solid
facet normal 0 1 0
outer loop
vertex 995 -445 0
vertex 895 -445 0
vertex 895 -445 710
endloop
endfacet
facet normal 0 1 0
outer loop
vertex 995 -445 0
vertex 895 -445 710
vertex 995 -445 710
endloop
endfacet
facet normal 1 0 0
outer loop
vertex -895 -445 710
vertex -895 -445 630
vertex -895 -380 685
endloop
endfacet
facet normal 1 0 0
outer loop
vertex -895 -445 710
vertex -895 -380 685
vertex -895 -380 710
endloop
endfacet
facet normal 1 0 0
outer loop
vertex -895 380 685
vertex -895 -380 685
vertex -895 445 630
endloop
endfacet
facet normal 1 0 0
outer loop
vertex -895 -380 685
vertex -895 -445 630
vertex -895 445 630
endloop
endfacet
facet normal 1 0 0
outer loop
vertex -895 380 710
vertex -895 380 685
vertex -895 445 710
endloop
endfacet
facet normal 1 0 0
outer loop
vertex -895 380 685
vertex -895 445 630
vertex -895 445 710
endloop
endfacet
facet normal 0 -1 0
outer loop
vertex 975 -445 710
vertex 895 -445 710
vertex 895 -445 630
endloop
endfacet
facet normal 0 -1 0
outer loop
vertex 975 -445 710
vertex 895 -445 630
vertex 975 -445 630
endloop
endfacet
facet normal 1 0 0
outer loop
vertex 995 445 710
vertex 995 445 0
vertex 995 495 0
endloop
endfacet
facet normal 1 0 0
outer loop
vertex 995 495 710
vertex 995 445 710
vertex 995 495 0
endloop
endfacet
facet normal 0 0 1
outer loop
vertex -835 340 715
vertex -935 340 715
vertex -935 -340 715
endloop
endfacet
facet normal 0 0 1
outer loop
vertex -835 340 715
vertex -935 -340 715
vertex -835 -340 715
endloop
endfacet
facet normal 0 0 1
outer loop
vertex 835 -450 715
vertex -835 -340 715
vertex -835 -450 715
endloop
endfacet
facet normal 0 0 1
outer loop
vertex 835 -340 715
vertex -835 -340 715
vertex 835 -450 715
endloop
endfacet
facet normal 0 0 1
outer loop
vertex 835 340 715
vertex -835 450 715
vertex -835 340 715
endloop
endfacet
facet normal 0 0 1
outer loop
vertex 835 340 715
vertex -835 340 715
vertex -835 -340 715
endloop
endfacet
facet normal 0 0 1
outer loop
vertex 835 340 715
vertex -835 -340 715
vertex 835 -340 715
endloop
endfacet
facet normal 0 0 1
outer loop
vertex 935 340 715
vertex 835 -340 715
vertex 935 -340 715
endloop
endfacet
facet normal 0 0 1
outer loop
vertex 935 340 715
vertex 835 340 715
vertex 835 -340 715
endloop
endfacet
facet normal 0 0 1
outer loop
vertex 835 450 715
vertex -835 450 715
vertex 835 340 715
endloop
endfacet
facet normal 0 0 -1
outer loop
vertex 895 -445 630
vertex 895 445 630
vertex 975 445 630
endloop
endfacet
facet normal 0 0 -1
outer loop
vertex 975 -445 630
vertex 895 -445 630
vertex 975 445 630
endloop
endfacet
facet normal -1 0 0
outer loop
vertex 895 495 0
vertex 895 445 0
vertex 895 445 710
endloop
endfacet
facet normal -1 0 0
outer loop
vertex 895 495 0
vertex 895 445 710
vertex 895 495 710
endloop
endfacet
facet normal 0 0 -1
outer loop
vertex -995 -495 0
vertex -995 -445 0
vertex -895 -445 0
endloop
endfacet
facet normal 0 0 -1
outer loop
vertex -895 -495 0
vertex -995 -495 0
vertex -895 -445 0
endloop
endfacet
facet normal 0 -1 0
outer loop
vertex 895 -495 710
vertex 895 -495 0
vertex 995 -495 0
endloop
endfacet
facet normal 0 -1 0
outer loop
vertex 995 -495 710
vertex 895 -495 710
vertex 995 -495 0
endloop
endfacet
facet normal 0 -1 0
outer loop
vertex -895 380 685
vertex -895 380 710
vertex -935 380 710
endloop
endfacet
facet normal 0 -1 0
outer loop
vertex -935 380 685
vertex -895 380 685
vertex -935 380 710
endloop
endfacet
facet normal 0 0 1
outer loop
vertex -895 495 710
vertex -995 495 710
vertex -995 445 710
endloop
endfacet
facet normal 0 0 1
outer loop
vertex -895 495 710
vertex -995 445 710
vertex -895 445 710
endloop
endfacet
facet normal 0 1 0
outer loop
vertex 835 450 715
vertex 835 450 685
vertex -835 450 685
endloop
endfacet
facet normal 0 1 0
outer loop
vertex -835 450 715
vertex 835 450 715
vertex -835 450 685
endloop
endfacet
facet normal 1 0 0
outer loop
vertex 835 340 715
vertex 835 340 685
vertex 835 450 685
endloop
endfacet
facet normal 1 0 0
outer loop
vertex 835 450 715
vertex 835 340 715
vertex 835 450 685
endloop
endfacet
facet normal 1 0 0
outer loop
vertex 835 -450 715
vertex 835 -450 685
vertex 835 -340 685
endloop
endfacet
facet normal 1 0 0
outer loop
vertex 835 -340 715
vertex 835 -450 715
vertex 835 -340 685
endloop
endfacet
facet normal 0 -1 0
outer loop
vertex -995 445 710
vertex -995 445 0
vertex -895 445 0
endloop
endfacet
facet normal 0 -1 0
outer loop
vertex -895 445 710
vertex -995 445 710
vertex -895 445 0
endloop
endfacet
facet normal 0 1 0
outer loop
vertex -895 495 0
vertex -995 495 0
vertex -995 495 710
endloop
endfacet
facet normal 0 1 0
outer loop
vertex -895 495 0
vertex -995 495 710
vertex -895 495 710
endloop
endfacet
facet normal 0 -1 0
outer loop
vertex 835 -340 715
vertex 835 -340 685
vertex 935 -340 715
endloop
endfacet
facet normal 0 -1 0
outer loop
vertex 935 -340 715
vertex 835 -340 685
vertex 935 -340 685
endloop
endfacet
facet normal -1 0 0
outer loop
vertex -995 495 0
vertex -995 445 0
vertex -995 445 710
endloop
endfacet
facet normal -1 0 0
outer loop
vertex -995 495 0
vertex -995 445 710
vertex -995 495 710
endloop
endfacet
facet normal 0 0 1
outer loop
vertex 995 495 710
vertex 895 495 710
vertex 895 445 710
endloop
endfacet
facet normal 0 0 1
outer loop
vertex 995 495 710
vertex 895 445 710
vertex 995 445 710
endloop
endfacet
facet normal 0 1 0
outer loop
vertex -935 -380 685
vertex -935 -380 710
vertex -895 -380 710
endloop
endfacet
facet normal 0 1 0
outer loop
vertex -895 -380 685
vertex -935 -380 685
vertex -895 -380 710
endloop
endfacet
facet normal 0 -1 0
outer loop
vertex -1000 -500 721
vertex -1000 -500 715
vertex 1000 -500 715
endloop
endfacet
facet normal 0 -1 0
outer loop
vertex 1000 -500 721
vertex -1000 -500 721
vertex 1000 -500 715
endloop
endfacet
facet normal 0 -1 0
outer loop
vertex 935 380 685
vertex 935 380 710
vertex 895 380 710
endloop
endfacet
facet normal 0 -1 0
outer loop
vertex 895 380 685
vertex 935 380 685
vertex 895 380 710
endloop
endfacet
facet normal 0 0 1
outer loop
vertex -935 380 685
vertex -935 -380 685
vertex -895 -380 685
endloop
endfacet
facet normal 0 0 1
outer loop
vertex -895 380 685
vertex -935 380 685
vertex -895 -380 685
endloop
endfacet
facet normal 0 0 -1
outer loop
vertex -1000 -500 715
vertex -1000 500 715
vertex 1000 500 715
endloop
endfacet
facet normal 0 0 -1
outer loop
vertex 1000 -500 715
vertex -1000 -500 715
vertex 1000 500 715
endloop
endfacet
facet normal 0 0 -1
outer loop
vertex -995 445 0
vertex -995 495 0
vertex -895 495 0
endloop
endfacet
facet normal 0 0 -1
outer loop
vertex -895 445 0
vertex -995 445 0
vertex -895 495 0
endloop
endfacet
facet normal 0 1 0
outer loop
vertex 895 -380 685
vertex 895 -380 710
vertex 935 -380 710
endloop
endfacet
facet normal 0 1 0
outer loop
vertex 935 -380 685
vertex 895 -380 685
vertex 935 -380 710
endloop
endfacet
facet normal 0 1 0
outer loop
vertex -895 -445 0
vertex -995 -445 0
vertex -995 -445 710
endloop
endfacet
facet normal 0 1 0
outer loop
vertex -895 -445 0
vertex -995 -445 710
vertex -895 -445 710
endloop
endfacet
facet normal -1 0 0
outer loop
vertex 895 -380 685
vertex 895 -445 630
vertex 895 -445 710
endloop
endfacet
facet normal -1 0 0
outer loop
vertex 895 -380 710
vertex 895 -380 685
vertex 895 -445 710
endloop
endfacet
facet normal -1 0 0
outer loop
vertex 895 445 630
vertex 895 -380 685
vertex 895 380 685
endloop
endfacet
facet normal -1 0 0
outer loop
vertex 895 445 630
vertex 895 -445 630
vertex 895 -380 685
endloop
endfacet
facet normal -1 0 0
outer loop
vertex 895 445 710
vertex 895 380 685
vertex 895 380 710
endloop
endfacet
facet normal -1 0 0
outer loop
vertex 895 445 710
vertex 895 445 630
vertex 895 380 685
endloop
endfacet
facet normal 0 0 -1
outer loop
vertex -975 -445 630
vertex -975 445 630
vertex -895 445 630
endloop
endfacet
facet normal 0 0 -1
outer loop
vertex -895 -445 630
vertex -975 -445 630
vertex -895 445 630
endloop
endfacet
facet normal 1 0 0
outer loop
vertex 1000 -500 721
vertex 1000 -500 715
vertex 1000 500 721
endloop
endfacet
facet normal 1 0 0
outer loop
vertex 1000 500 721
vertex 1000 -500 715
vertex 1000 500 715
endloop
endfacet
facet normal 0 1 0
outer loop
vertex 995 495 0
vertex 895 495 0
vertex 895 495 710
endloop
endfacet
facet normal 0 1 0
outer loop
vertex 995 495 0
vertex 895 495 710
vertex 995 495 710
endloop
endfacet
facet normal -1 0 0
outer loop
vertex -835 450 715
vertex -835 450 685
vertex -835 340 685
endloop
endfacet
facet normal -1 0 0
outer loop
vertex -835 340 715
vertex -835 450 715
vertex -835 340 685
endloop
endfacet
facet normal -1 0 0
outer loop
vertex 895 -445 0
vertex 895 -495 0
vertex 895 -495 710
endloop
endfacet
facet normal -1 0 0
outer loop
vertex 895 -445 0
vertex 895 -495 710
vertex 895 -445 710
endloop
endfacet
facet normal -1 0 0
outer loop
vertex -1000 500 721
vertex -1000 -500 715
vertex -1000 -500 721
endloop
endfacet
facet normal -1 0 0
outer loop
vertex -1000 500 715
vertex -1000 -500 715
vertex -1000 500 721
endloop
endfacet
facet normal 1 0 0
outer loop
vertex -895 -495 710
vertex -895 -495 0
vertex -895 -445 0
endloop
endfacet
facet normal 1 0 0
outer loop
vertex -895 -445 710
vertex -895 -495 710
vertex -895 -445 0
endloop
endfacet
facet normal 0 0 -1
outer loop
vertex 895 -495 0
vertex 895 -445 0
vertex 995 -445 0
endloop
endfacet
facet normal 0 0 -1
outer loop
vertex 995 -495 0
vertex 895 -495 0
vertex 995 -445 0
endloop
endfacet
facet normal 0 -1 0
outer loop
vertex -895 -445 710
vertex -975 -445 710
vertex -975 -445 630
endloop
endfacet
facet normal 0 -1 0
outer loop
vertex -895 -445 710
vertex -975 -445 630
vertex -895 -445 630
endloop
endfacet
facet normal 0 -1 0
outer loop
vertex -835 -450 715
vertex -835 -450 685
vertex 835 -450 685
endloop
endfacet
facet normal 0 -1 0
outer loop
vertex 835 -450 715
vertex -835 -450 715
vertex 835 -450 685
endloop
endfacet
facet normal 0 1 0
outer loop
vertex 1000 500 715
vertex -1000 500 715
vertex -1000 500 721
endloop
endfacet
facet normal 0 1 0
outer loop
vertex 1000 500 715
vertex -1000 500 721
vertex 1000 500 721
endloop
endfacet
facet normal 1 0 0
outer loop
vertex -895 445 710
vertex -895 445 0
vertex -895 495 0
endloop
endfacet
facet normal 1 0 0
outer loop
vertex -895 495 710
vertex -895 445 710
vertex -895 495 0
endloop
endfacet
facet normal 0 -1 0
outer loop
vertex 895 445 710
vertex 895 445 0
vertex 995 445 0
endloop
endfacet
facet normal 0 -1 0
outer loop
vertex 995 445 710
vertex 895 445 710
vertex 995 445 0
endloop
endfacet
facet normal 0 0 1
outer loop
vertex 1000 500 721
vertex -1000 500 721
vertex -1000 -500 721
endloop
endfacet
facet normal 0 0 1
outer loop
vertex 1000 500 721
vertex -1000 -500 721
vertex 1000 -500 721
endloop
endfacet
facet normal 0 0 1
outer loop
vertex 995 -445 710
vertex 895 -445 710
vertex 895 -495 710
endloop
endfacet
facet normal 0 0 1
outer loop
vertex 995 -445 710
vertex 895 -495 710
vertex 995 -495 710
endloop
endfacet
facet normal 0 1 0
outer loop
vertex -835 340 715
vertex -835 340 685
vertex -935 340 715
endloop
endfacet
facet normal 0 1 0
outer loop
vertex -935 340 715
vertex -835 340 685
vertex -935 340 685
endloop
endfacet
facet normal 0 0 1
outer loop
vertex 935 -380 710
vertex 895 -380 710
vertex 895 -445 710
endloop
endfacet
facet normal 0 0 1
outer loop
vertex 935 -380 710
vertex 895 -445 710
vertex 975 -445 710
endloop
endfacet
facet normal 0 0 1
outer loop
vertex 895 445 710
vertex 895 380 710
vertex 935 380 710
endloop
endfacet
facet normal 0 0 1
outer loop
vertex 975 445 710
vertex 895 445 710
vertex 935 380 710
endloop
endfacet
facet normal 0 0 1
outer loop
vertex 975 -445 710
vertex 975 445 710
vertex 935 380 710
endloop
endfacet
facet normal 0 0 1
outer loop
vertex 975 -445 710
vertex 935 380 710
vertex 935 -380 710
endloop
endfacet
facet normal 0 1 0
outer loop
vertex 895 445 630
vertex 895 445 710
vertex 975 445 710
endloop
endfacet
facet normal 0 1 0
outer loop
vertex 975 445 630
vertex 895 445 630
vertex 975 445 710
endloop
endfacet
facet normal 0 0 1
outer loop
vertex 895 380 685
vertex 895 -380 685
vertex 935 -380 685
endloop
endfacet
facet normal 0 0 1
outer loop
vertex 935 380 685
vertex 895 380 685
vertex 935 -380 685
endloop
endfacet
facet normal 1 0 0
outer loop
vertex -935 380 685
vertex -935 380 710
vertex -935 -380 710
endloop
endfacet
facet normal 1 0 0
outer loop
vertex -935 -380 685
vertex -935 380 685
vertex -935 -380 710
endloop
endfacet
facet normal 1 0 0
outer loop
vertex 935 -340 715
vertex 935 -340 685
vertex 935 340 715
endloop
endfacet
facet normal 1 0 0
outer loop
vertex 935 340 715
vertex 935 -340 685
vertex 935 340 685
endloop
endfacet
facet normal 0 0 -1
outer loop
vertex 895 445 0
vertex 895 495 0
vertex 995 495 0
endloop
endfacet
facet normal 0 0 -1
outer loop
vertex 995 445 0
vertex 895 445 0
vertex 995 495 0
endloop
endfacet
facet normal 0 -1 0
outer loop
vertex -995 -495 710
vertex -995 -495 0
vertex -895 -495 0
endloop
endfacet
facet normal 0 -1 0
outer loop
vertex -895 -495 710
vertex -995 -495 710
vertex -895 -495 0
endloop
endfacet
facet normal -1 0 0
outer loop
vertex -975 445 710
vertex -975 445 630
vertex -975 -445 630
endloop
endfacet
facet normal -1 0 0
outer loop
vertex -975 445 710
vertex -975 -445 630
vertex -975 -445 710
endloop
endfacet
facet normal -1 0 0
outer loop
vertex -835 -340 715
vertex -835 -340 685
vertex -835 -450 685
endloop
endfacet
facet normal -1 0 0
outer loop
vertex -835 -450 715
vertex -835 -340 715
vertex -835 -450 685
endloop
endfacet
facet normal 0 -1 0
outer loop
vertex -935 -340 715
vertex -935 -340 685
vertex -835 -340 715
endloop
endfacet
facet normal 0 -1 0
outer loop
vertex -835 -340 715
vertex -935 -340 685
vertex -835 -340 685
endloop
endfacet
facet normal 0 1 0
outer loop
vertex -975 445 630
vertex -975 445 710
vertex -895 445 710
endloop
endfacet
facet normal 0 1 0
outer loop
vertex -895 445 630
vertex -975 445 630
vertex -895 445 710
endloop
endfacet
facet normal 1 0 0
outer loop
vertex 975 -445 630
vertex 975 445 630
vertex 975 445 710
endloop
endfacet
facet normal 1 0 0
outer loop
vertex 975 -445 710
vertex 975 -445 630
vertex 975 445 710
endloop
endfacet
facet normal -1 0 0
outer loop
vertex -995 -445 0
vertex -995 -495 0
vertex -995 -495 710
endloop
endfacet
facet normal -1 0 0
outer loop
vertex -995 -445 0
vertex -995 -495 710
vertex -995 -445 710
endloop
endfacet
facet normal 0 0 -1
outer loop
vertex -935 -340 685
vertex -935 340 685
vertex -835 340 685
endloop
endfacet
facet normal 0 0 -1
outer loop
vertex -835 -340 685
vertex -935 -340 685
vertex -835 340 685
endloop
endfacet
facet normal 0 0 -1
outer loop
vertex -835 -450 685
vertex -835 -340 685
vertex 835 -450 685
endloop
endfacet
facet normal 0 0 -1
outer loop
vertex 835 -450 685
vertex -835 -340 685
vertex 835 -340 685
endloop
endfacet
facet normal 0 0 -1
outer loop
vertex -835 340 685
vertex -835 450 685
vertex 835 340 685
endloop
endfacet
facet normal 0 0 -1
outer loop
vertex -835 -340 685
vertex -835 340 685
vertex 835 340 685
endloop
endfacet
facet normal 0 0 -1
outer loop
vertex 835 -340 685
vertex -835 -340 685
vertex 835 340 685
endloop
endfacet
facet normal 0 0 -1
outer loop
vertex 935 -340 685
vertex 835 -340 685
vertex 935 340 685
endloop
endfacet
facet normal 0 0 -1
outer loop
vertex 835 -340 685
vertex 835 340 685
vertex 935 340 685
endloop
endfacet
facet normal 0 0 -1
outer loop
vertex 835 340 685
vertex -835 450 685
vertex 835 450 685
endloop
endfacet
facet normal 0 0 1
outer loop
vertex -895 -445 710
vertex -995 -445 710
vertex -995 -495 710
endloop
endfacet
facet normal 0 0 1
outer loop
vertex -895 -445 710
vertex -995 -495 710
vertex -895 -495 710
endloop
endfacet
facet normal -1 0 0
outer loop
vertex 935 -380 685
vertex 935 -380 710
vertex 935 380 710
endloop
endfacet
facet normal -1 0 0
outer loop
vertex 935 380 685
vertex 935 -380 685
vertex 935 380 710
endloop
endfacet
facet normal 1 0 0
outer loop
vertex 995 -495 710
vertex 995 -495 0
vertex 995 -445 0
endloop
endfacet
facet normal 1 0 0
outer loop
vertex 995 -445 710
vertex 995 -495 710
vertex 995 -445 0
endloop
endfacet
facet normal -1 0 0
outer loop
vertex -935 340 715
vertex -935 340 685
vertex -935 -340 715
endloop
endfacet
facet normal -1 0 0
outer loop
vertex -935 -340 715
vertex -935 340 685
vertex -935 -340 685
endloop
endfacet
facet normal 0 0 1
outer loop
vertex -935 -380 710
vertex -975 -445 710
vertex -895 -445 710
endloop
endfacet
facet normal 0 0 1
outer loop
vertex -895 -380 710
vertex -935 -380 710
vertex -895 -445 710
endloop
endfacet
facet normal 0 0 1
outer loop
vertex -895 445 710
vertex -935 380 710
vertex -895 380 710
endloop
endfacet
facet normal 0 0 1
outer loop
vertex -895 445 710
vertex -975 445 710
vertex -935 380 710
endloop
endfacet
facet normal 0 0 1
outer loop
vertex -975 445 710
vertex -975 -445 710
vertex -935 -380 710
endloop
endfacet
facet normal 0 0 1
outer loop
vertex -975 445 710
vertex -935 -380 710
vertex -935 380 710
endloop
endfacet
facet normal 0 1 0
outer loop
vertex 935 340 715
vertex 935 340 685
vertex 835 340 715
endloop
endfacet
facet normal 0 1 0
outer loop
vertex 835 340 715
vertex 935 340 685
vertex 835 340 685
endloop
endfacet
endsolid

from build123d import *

# Parameters (mm, degrees)
F0_W     = 100
F0_H     = 50
F1_DEPTH = 710
F2_W     = 80
F2_H     = 80
F3_DEPTH = 890
F5_DEPTH = 25
F7_DEPTH = 30
F8_W     = 2000
F8_H     = 1000
F9_DEPTH = 6


with BuildPart() as f1:
    # F0 (on Top) → F1 (new body)
    with BuildSketch(Plane.XY):
        with Locations((-945, 470)):
            Rectangle(F0_W, F0_H)
        with Locations((945, 470)):
            Rectangle(F0_W, F0_H)
        with Locations((945, -470)):
            Rectangle(F0_W, F0_H)
        with Locations((-945, -470)):
            Rectangle(F0_W, F0_H)
    extrude(amount=F1_DEPTH)


with BuildPart() as f3:
    # F2 (on face) → F3 (new body, through all)
    with BuildSketch(Plane.XZ.offset(-445)):
        with Locations((-935, 670)):
            Rectangle(F2_W, F2_H)
        with Locations((935, 670)):
            Rectangle(F2_W, F2_H)
    extrude(amount=F3_DEPTH)

    # F4 (on face) → F5 (cut)
    with BuildSketch(Plane.XY.offset(710)):
        Polygon((-935, 380), (-935, 0), (-935, -380), (-895, -380), (-895, 0), (-895, 380), align=None)
        Polygon((935, 0), (935, 380), (895, 380), (895, 0), (895, -380), (935, -380), align=None)
    extrude(amount=-F5_DEPTH, mode=Mode.SUBTRACT)


with BuildPart() as f7:
    # F6 (on face) → F7 (new body)
    with BuildSketch(Plane.XY.offset(685)):
        Polygon((-935, 340), (-935, 0), (-935, -340), (-835, -340), (-835, -450), (0, -450), (835, -450), (835, -340), (935, -340), (935, 0), (935, 340), (835, 340), (835, 450), (0, 450), (-835, 450), (-835, 340), align=None)
    extrude(amount=F7_DEPTH)


with BuildPart() as f9:
    # F8 (on face) → F9 (new body)
    with BuildSketch(Plane.XY.offset(715)):
        Rectangle(F8_W, F8_H)
    extrude(amount=F9_DEPTH)


solid = Compound([f1.part, f3.part, f7.part, f9.part])
